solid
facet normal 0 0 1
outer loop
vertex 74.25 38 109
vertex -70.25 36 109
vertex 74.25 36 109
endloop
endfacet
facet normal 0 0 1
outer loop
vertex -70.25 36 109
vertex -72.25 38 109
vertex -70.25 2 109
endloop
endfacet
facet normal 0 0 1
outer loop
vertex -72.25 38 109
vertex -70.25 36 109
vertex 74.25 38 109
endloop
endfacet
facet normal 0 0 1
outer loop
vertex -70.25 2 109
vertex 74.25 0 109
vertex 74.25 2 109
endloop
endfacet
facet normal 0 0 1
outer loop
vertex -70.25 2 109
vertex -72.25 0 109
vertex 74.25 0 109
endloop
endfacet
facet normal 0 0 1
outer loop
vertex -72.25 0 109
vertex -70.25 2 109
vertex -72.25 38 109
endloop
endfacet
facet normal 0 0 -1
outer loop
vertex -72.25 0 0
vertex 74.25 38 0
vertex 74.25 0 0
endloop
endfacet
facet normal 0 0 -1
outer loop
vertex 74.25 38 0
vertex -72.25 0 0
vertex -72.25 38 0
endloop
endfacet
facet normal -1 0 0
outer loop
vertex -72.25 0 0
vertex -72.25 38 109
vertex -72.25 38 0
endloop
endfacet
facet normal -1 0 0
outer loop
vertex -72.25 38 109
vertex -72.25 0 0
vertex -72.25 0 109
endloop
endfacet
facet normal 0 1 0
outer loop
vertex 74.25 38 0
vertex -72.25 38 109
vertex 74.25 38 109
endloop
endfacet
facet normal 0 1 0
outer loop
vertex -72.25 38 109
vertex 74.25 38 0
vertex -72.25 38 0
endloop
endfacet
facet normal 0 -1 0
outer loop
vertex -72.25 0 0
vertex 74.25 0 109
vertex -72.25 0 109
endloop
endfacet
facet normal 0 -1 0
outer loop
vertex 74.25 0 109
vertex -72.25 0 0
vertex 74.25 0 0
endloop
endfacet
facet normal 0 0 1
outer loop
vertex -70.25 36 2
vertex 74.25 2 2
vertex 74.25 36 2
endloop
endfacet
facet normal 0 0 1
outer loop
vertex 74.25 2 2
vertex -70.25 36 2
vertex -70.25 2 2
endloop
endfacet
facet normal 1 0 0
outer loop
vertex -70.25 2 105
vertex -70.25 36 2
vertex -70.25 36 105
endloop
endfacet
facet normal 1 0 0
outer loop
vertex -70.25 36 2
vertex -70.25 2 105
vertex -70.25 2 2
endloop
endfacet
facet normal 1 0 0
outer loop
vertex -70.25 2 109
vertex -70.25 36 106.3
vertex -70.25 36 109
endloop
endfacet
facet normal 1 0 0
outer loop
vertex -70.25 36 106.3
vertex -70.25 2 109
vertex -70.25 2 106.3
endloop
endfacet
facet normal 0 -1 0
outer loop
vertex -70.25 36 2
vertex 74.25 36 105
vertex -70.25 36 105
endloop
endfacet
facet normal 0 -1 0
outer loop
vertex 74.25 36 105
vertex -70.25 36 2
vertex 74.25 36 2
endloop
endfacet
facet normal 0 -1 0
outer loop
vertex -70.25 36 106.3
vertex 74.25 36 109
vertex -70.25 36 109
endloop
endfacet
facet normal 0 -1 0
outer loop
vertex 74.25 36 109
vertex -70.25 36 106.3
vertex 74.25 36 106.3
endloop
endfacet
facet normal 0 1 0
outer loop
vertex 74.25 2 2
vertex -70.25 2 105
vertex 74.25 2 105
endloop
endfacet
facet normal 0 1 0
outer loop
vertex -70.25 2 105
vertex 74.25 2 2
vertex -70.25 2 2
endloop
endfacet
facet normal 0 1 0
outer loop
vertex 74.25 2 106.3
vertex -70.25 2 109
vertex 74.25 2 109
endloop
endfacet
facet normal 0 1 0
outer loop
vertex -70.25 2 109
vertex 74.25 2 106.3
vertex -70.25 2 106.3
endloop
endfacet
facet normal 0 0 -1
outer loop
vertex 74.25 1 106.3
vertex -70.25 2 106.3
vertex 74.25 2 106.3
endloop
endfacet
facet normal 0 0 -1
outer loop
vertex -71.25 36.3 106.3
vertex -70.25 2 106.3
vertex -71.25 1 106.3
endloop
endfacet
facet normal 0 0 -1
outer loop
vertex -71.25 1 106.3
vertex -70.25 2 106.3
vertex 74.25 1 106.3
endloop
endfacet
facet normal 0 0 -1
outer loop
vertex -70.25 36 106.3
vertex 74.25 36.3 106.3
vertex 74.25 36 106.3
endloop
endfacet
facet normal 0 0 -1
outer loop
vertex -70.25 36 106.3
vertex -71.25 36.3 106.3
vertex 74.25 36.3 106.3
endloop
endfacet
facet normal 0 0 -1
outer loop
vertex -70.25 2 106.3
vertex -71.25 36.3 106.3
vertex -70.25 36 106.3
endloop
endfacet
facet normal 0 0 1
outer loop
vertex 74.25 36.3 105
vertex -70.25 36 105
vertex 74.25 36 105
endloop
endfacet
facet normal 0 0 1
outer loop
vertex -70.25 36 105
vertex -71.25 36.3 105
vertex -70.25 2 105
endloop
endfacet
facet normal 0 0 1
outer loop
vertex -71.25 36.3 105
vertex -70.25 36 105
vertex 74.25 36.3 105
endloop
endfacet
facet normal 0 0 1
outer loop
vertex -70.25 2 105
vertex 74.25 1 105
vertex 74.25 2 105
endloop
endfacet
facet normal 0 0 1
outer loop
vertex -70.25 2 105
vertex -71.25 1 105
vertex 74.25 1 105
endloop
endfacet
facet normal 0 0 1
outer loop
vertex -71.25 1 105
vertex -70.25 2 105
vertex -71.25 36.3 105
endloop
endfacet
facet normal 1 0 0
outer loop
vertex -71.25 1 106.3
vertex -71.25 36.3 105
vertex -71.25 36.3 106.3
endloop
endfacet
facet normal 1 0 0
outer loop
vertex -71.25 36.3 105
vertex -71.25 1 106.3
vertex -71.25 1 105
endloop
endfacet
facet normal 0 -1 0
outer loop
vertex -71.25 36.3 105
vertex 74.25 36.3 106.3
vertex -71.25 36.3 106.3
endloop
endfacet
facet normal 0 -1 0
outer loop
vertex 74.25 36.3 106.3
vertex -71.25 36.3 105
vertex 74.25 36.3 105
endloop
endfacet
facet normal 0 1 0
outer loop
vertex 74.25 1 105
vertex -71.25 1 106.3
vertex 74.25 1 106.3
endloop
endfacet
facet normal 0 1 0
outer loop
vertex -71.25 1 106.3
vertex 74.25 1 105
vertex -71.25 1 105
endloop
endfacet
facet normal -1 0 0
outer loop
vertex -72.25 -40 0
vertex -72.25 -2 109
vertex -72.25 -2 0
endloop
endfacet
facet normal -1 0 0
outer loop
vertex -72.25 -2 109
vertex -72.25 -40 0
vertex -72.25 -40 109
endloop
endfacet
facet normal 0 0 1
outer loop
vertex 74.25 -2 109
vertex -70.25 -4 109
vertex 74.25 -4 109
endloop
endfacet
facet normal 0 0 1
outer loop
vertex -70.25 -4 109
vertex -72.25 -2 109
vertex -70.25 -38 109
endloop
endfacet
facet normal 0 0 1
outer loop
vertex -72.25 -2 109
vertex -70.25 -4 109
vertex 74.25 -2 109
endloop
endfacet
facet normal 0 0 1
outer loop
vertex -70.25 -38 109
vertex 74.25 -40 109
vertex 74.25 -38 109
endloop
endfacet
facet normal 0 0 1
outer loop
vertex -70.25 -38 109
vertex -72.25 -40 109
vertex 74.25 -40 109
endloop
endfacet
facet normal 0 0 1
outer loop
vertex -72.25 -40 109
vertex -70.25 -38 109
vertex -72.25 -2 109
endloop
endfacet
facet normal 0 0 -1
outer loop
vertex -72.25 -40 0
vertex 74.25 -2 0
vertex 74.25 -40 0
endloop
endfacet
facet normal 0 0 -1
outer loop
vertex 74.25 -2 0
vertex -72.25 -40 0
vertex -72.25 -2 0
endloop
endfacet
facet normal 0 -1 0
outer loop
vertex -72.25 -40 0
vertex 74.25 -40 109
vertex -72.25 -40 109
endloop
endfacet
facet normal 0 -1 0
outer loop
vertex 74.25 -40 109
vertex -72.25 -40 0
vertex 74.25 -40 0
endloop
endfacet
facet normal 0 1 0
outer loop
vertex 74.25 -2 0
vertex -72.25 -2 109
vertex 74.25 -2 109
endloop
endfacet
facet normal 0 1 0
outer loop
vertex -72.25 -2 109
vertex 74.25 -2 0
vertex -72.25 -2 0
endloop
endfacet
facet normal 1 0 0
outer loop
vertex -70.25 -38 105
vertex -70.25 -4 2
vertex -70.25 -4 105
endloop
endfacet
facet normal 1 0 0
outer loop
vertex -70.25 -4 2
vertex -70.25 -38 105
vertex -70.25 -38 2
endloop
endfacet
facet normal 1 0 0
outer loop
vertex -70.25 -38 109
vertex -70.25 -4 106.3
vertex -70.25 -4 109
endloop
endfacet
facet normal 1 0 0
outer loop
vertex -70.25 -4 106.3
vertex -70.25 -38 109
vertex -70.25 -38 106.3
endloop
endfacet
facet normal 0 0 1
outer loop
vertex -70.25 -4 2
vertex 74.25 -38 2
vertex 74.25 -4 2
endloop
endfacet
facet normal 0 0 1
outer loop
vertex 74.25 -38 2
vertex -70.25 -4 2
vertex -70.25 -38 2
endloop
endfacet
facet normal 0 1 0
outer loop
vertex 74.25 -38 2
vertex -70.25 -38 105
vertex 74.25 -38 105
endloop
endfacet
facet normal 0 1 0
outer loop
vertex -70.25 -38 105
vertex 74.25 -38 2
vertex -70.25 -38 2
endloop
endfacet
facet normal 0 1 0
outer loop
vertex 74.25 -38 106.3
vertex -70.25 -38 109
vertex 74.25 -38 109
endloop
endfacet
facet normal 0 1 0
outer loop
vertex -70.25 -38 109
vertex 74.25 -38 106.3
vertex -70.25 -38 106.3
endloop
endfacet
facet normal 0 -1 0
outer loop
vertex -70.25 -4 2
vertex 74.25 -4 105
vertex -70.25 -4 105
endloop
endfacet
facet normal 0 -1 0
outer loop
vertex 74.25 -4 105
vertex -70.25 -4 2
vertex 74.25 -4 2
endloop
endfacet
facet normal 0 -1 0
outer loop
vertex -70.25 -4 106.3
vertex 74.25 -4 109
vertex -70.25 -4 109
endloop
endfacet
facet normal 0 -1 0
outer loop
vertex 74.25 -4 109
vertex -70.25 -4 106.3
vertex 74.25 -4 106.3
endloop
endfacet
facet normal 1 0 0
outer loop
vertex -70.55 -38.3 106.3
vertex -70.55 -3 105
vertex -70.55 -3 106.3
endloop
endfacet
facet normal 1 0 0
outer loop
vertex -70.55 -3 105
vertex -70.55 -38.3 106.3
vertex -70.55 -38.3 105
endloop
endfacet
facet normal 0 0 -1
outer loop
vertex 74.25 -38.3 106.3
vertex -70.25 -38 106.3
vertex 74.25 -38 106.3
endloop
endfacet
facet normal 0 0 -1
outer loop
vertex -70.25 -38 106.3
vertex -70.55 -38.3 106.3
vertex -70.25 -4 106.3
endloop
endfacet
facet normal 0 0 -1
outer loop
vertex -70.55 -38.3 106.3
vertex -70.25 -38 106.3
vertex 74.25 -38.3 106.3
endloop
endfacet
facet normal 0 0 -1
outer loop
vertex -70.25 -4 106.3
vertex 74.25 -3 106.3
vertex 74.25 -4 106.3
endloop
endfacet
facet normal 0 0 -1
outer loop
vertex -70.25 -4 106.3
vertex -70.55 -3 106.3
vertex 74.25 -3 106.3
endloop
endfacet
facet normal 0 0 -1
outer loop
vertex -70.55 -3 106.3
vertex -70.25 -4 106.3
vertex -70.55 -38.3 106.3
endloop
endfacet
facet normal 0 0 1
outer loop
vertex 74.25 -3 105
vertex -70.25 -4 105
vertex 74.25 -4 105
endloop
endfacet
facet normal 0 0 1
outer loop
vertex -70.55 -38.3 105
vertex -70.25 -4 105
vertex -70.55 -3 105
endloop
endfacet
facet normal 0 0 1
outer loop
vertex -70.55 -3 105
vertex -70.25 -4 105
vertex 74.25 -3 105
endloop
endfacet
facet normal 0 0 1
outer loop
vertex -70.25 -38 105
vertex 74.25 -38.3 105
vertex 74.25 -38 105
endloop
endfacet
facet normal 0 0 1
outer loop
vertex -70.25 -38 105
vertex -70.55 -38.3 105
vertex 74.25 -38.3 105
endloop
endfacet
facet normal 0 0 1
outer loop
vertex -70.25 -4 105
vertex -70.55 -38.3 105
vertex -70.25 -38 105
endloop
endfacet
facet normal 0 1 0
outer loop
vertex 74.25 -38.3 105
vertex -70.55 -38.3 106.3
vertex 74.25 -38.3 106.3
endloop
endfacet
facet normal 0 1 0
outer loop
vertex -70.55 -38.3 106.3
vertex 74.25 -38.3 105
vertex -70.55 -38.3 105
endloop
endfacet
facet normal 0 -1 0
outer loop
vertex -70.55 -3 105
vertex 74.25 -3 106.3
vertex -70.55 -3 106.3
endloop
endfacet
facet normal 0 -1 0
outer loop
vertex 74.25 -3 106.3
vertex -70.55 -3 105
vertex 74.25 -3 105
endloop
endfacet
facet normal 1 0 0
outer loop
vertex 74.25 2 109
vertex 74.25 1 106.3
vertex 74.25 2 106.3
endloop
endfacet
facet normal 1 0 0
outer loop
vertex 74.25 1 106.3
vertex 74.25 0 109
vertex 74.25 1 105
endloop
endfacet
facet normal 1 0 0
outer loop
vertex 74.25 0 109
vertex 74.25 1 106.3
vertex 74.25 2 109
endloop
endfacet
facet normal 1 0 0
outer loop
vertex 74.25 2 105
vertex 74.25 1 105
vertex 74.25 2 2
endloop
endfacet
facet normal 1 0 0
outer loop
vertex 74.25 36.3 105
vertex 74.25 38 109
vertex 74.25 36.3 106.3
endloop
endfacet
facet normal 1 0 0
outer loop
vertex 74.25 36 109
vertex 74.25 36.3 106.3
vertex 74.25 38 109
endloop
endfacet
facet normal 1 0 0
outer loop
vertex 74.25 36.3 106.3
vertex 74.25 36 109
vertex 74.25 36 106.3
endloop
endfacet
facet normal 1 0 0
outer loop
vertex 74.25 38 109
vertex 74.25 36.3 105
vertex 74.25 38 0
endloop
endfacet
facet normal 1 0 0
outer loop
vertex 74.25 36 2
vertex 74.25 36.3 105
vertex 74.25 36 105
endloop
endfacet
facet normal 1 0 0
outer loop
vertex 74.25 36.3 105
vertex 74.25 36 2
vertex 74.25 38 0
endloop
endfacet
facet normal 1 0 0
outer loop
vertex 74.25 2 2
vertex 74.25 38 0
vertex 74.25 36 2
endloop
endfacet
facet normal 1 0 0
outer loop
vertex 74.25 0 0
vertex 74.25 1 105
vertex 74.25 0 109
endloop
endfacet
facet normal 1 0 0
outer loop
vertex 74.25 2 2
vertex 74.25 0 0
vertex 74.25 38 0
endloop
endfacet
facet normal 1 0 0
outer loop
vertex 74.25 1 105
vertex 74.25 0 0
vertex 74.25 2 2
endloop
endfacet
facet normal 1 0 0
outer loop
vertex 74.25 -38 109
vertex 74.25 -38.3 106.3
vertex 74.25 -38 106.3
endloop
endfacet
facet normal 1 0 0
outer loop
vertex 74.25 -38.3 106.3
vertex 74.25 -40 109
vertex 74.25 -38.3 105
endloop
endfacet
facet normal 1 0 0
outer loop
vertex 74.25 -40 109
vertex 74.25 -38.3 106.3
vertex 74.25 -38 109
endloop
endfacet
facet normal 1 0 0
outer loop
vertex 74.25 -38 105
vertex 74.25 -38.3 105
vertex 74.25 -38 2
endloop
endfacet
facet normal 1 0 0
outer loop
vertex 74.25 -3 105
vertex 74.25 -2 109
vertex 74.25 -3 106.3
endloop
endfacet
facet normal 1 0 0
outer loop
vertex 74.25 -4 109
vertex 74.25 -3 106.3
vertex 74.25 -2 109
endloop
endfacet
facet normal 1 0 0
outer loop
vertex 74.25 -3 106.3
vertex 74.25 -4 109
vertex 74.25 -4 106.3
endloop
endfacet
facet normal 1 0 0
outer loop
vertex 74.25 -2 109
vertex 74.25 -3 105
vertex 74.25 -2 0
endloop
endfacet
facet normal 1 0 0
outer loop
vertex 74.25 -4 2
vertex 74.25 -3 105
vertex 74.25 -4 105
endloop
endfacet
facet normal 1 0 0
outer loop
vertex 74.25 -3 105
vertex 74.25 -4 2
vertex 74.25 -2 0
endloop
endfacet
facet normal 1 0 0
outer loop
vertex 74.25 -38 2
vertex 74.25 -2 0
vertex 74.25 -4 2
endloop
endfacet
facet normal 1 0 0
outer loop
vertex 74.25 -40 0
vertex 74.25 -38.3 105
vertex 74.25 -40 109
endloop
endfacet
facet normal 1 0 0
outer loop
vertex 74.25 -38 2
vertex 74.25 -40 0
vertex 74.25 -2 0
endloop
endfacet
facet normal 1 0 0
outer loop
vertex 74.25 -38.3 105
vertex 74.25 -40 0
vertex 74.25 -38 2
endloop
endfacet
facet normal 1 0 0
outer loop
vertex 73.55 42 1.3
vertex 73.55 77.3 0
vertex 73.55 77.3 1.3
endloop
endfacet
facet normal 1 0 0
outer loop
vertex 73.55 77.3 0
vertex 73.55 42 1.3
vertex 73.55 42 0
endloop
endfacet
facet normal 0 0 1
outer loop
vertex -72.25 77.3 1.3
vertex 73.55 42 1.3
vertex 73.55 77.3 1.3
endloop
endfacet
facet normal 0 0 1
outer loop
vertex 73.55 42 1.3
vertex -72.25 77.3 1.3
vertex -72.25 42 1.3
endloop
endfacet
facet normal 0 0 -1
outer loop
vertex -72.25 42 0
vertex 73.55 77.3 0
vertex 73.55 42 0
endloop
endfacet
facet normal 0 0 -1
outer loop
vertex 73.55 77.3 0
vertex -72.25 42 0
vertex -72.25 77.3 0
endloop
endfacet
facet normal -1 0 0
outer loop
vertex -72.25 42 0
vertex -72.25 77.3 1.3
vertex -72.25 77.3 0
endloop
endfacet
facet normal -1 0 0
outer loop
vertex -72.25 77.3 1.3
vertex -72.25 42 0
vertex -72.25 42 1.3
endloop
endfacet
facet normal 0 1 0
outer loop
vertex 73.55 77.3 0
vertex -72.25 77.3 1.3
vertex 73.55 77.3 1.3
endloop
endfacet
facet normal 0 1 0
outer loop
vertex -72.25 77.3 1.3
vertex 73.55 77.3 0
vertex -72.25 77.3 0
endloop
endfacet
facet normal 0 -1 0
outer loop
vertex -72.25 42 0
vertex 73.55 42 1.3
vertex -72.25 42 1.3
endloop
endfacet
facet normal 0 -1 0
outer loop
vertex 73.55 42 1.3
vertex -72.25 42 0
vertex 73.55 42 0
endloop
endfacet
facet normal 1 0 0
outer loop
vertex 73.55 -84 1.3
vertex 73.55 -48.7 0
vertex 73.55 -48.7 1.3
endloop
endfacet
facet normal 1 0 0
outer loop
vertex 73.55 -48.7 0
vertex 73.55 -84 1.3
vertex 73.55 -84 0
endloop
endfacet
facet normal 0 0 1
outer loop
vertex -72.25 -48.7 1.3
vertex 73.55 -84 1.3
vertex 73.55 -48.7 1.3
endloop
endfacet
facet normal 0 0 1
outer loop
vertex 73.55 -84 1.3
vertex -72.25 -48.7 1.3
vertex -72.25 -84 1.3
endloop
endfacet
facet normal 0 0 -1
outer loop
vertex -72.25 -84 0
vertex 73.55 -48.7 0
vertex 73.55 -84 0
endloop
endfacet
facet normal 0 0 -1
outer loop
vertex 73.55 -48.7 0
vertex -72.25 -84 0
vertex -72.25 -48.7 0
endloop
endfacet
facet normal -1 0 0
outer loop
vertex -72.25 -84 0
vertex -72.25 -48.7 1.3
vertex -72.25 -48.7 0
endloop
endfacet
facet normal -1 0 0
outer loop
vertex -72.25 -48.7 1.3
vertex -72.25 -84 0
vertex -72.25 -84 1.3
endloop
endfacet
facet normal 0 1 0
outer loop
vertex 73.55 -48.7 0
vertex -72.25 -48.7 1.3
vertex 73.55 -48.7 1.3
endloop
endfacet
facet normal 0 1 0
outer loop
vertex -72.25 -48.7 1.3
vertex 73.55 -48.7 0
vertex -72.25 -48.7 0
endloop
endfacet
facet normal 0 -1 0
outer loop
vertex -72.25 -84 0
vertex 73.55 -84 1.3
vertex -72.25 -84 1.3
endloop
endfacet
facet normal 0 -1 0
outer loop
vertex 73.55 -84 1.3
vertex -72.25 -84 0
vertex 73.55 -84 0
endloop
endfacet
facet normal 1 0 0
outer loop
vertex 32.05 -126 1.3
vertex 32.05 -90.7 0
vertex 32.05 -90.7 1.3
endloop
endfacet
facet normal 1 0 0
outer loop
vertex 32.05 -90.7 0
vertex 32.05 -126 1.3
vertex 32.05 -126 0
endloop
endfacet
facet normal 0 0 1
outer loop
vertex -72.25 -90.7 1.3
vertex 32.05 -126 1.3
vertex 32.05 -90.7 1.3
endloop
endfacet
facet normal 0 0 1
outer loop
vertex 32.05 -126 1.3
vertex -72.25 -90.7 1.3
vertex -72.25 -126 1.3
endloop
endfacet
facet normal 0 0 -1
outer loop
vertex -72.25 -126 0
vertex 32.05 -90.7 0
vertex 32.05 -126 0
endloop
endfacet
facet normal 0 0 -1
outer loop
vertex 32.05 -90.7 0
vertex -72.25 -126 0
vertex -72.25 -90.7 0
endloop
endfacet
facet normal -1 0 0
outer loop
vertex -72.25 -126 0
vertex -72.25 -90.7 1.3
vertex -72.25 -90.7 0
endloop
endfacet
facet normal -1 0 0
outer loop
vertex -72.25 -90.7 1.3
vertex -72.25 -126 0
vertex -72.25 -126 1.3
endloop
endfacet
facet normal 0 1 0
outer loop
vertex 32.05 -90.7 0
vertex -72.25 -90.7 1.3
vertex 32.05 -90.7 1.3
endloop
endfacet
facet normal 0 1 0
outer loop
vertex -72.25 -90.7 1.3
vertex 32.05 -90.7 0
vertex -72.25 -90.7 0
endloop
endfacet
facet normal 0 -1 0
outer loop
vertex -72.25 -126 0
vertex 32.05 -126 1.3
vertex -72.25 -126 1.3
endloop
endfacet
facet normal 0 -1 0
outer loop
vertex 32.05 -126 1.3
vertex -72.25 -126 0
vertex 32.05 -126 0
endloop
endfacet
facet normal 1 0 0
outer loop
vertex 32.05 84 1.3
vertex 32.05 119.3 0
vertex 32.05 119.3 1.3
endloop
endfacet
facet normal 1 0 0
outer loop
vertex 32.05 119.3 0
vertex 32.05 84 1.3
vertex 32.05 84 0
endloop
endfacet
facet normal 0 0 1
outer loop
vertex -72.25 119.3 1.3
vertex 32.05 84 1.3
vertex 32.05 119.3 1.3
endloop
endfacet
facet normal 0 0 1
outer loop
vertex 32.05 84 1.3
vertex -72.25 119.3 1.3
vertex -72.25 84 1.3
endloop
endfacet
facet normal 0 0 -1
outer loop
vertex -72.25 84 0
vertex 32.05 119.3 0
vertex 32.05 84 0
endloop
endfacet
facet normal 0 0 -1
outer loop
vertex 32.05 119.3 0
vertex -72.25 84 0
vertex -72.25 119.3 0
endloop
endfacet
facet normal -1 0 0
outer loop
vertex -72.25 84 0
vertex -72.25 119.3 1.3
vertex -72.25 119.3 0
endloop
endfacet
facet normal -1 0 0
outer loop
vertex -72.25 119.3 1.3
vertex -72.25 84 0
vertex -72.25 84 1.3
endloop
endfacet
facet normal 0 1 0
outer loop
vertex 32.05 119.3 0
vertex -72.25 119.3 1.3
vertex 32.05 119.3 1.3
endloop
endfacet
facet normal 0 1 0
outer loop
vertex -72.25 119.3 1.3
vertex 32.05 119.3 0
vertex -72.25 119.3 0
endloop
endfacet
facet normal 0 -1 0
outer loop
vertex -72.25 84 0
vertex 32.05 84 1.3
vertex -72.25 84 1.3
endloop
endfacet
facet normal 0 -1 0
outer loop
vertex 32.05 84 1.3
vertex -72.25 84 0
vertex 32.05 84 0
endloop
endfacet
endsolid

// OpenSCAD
width = 50;
depth = 40;
height = 5;
wall_width = 2;
screen_width = 44;
screen_depth = 34;

module shell_mesh(width, depth, height, wall_width) {
    difference() {
        cube([width+(wall_width*2), depth+(wall_width*2), height+wall_width*3]);
        translate([wall_width, wall_width, wall_width]) cube([width, depth, height*10]);
    };
};

module slide(width, depth, height, wall_width) {
    cube([width+wall_width-0.7, depth+wall_width-0.7, wall_width-0.7]);
};

module slide_with_margin(width, depth, height, wall_width) {
    translate([wall_width/2, wall_width/2, height+wall_width]) slide(width, depth, height, wall_width);
};

module shell_with_tracks(width, depth, height, wall_width) {
    difference() {
        shell_mesh(width, depth, height, wall_width);
        slide_with_margin(width, depth, height, wall_width);
    };
};

module shell_with_screen_cutout(width, depth, height, wall_width, screen_width, screen_depth) {
    difference() {
        shell_with_tracks(width, depth, height, wall_width);
        translate([(width-screen_width-wall_width/2), (depth-screen_depth-wall_width/2), -height/2]) cube([screen_width, screen_depth, height]);
    };
};

module screen_case() {
    translate([-(width+wall_width)/2, -(depth+wall_width)/2, 0]) {
        shell_with_screen_cutout(width, depth, height, wall_width, screen_width, screen_depth);
    };
};

module keyboard_case() {
    difference() {
        union() {
            shell_with_tracks(289, 34, 103, wall_width);
            translate([289+wall_width*2, -2, 0]) {
                rotate([0, 0, 180]) {
                    shell_with_tracks(289, 34, 103, wall_width);
                };
            };
        };
        translate([(289+wall_width*2)/2, -100, -10]) {
            cube([300, 300, 300]);
        };
    };
    translate([0, 42, 0]) slide(289/2, 34, 103, wall_width);
    translate([0, -84, 0]) slide(289/2, 34, 103, wall_width);
    translate([0, -126, 0]) slide(103, 34, 103, wall_width);
    translate([0, 84, 0]) slide(103, 34, 103, wall_width);
}

translate([-289/4, 0, 0]) keyboard_case();
